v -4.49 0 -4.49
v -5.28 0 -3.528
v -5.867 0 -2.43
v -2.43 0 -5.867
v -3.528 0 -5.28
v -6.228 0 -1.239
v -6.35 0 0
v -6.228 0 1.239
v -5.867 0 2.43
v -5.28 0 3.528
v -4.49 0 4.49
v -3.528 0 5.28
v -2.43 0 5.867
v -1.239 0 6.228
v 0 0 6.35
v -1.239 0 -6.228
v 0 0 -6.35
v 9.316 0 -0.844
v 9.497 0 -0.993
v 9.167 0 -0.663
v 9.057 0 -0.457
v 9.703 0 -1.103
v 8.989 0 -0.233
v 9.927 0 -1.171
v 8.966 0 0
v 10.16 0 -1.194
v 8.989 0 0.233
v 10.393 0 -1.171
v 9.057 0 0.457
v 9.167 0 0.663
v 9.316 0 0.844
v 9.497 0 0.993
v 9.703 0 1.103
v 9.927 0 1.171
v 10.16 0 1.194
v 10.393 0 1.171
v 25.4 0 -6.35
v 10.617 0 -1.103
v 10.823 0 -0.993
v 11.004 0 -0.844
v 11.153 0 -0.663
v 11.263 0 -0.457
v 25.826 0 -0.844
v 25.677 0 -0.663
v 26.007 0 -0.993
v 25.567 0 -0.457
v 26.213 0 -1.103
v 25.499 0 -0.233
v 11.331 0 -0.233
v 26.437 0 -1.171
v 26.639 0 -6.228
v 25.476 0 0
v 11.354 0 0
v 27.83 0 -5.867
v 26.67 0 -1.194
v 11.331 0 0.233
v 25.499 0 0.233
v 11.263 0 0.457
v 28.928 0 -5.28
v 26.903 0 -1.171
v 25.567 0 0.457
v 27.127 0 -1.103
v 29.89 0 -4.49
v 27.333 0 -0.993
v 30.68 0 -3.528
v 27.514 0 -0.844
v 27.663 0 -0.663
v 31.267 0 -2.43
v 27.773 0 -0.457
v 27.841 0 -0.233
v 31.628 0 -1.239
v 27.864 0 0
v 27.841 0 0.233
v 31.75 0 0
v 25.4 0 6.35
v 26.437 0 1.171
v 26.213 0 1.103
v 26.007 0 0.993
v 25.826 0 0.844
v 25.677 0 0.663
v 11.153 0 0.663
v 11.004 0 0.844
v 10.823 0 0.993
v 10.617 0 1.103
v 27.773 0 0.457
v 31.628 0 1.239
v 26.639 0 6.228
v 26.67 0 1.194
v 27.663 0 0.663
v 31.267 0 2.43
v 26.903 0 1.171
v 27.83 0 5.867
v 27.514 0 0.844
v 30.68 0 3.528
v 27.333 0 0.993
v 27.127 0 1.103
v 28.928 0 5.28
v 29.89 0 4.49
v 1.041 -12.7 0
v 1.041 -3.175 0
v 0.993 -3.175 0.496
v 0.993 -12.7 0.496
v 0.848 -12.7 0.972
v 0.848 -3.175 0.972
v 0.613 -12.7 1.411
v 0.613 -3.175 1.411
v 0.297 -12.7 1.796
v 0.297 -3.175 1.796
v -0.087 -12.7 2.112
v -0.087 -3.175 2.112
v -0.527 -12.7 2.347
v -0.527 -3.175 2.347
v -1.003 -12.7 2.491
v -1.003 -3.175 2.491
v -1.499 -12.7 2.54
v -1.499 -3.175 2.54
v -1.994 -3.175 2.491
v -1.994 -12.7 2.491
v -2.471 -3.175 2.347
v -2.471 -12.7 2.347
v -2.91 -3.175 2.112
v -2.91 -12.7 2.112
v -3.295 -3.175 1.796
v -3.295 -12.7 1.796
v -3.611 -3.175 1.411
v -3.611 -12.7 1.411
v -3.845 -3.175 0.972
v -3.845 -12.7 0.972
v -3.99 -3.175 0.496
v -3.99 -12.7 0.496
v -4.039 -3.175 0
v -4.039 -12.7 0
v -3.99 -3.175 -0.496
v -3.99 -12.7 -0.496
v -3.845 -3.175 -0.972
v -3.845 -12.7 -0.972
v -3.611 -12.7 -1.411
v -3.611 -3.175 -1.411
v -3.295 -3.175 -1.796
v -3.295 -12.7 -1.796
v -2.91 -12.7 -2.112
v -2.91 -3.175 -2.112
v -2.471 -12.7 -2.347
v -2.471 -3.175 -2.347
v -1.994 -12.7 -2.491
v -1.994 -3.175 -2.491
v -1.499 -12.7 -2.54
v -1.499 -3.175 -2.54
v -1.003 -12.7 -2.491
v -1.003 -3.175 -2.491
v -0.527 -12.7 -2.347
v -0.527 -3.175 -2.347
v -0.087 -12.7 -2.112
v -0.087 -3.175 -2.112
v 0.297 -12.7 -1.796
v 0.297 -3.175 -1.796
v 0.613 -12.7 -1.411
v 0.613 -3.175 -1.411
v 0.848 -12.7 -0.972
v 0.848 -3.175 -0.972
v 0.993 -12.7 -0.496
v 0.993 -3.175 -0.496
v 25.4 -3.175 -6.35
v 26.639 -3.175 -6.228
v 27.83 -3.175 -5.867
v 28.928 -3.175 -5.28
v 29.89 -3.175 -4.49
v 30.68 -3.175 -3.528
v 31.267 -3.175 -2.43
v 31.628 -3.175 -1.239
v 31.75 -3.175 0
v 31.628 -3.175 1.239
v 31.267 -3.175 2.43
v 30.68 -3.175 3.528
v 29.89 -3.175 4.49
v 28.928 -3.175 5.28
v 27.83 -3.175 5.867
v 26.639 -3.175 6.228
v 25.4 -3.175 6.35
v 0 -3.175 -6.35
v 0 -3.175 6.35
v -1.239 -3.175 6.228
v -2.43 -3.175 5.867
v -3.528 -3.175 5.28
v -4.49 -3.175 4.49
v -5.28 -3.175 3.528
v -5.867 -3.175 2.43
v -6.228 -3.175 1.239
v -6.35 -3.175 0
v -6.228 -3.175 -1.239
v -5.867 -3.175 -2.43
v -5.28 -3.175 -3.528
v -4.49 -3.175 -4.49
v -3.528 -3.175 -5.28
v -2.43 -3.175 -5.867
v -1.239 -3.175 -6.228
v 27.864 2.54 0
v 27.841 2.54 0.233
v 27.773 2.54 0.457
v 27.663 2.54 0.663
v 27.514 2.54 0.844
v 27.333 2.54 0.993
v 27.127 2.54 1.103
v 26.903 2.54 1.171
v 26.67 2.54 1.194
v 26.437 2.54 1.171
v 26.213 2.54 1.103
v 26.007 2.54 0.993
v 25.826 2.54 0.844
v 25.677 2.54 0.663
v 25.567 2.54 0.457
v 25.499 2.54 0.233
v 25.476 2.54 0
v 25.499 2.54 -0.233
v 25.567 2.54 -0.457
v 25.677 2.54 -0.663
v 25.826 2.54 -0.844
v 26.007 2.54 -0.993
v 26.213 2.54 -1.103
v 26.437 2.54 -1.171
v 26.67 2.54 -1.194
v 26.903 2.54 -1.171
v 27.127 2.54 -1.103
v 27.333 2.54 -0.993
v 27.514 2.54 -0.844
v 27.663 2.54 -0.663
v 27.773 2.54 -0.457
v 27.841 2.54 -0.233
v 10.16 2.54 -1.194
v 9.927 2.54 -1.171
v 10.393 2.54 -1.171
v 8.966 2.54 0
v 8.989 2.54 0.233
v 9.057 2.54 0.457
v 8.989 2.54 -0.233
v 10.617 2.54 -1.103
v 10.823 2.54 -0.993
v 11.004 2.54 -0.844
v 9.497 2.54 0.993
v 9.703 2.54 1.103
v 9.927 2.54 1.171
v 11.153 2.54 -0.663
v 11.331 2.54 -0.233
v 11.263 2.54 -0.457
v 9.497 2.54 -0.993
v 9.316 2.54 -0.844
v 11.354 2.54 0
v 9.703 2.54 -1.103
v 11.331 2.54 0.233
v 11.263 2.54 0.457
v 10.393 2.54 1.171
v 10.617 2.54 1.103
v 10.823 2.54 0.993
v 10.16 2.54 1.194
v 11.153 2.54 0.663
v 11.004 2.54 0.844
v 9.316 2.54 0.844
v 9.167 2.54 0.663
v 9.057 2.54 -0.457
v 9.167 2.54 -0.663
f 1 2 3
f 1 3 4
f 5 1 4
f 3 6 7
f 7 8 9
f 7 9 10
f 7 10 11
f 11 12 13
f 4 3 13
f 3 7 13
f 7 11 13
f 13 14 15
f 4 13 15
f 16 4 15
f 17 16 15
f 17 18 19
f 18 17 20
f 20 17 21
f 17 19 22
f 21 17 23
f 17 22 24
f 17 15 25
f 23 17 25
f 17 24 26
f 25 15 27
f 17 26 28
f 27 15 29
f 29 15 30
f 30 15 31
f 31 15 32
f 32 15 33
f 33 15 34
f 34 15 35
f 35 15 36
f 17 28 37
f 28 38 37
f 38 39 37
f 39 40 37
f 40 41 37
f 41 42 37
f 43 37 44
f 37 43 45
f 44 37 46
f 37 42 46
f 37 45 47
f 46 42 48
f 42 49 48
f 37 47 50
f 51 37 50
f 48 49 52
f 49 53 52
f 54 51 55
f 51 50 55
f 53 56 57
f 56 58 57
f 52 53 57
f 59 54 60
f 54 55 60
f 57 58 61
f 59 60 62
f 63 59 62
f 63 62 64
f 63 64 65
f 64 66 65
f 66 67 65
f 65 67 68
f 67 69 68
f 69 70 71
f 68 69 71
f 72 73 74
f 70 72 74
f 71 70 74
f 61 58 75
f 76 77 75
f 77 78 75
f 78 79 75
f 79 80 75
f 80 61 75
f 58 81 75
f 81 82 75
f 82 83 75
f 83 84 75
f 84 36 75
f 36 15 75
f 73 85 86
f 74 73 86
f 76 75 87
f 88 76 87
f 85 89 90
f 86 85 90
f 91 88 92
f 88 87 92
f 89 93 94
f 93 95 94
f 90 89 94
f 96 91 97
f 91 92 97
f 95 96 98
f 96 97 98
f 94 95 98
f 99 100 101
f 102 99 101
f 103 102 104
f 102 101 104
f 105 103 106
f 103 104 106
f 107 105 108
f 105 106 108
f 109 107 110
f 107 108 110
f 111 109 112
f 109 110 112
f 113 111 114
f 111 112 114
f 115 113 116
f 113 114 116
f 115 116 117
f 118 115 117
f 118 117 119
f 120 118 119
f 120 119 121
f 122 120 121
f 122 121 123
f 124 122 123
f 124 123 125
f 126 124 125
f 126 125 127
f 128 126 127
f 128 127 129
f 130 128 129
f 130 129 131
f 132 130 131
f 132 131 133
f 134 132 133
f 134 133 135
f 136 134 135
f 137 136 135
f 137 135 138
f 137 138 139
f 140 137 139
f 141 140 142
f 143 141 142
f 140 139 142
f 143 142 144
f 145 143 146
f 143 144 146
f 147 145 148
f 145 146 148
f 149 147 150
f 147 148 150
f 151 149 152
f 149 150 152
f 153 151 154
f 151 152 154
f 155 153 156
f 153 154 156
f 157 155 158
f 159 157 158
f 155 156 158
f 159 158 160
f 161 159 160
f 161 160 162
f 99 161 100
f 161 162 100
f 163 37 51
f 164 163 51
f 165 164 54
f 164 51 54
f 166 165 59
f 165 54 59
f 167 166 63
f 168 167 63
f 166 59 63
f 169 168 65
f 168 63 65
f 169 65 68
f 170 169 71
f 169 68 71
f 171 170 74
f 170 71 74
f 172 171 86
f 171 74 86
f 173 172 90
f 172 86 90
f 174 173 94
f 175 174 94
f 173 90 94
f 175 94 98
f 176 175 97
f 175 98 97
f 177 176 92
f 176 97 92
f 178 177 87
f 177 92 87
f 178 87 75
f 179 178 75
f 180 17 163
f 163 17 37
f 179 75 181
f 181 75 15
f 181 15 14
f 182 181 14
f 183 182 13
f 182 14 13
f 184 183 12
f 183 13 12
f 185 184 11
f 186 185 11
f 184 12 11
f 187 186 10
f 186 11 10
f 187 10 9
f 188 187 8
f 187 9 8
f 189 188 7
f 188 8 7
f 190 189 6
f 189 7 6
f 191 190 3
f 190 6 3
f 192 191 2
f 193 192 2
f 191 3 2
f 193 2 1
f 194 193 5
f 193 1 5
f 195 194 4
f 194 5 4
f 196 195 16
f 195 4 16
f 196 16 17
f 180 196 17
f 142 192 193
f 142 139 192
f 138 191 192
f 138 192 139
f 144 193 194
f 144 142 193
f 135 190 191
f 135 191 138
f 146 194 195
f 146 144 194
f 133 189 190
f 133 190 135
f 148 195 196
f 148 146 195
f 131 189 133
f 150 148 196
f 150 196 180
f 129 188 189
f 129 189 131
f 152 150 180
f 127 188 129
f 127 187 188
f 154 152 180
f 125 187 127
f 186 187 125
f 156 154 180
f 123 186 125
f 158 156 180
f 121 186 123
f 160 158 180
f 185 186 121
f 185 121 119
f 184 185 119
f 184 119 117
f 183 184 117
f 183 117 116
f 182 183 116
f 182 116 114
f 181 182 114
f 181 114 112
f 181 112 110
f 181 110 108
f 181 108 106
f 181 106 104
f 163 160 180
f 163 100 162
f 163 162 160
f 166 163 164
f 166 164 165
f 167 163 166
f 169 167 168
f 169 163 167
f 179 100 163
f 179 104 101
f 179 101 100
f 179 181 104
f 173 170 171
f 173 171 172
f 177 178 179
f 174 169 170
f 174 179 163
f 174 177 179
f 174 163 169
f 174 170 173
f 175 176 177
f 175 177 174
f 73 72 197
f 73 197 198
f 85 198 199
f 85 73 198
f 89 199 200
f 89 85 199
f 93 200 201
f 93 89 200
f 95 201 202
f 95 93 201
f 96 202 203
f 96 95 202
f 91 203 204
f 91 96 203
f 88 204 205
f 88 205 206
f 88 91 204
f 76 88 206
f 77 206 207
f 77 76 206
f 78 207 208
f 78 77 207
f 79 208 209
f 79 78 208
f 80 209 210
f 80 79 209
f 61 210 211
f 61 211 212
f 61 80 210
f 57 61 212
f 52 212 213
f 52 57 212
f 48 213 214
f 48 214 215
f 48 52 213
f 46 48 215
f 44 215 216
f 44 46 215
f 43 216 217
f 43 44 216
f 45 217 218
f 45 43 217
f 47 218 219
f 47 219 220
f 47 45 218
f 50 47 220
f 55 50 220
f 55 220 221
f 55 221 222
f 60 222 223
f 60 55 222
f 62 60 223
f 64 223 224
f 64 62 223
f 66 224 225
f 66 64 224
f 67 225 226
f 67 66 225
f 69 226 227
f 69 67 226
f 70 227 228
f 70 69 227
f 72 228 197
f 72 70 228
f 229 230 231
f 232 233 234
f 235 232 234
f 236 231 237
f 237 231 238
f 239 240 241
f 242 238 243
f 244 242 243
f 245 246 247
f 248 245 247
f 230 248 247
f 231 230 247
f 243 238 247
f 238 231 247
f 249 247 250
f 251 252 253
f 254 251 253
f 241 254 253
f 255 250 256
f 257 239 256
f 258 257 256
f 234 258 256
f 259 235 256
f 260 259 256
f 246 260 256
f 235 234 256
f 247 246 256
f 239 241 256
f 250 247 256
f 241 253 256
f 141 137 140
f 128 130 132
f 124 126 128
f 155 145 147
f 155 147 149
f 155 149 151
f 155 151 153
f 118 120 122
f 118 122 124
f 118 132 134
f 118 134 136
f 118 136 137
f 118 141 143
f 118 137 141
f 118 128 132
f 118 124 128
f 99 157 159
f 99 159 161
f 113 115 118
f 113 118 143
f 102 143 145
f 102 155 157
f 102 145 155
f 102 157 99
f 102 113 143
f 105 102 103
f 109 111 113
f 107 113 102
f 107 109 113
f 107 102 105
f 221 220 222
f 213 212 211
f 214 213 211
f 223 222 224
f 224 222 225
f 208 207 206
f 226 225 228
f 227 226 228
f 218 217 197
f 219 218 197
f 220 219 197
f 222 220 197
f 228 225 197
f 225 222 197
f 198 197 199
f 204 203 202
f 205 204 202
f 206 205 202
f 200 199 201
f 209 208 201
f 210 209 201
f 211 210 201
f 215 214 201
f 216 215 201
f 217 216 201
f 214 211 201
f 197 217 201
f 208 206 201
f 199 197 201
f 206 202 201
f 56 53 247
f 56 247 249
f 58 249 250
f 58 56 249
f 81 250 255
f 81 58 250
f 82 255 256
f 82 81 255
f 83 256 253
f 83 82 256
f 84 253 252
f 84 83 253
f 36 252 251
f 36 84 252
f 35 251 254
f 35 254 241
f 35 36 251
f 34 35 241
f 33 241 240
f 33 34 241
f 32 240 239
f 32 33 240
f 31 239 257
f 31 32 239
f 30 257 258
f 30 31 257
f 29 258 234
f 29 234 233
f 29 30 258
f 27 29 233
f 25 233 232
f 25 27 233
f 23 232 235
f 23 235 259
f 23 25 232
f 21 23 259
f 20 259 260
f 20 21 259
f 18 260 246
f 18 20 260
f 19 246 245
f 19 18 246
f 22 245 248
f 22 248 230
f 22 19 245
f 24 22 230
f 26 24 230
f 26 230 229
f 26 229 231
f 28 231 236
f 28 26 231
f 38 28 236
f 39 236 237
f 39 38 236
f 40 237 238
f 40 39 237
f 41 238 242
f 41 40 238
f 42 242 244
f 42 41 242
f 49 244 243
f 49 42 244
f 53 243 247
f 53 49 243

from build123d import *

# Parameters (mm, degrees)
F1_DEPTH = 3.175
F2_R     = 1.1938
F3_DEPTH = 2.54
F4_R     = 2.54
F5_DEPTH = 12.7


with BuildPart() as f1:
    # F0 (on Front) → F1 (new body)
    with BuildSketch(Plane.XZ):
        with BuildLine():
            Line((25.4, 6.35), (0, 6.35))
            ThreePointArc((0, 6.35), (-6.35, 0), (0, -6.35))
            Line((0, -6.35), (25.4, -6.35))
            ThreePointArc((25.4, -6.35), (31.75, 0), (25.4, 6.35))
        make_face()
    extrude(amount=F1_DEPTH)

    # F2 (on Front) → F3 (join)
    with BuildSketch(Plane.XZ):
        with Locations((10.16, 0)):
            Circle(F2_R)
        with Locations((26.67, 0)):
            Circle(F2_R)
    extrude(amount=-F3_DEPTH)

    # F4 (on Front) → F5 (join)
    with BuildSketch(Plane.XZ):
        with Locations((-1.4986, 0)):
            Circle(F4_R)
    extrude(amount=F5_DEPTH)


solid = f1.part
